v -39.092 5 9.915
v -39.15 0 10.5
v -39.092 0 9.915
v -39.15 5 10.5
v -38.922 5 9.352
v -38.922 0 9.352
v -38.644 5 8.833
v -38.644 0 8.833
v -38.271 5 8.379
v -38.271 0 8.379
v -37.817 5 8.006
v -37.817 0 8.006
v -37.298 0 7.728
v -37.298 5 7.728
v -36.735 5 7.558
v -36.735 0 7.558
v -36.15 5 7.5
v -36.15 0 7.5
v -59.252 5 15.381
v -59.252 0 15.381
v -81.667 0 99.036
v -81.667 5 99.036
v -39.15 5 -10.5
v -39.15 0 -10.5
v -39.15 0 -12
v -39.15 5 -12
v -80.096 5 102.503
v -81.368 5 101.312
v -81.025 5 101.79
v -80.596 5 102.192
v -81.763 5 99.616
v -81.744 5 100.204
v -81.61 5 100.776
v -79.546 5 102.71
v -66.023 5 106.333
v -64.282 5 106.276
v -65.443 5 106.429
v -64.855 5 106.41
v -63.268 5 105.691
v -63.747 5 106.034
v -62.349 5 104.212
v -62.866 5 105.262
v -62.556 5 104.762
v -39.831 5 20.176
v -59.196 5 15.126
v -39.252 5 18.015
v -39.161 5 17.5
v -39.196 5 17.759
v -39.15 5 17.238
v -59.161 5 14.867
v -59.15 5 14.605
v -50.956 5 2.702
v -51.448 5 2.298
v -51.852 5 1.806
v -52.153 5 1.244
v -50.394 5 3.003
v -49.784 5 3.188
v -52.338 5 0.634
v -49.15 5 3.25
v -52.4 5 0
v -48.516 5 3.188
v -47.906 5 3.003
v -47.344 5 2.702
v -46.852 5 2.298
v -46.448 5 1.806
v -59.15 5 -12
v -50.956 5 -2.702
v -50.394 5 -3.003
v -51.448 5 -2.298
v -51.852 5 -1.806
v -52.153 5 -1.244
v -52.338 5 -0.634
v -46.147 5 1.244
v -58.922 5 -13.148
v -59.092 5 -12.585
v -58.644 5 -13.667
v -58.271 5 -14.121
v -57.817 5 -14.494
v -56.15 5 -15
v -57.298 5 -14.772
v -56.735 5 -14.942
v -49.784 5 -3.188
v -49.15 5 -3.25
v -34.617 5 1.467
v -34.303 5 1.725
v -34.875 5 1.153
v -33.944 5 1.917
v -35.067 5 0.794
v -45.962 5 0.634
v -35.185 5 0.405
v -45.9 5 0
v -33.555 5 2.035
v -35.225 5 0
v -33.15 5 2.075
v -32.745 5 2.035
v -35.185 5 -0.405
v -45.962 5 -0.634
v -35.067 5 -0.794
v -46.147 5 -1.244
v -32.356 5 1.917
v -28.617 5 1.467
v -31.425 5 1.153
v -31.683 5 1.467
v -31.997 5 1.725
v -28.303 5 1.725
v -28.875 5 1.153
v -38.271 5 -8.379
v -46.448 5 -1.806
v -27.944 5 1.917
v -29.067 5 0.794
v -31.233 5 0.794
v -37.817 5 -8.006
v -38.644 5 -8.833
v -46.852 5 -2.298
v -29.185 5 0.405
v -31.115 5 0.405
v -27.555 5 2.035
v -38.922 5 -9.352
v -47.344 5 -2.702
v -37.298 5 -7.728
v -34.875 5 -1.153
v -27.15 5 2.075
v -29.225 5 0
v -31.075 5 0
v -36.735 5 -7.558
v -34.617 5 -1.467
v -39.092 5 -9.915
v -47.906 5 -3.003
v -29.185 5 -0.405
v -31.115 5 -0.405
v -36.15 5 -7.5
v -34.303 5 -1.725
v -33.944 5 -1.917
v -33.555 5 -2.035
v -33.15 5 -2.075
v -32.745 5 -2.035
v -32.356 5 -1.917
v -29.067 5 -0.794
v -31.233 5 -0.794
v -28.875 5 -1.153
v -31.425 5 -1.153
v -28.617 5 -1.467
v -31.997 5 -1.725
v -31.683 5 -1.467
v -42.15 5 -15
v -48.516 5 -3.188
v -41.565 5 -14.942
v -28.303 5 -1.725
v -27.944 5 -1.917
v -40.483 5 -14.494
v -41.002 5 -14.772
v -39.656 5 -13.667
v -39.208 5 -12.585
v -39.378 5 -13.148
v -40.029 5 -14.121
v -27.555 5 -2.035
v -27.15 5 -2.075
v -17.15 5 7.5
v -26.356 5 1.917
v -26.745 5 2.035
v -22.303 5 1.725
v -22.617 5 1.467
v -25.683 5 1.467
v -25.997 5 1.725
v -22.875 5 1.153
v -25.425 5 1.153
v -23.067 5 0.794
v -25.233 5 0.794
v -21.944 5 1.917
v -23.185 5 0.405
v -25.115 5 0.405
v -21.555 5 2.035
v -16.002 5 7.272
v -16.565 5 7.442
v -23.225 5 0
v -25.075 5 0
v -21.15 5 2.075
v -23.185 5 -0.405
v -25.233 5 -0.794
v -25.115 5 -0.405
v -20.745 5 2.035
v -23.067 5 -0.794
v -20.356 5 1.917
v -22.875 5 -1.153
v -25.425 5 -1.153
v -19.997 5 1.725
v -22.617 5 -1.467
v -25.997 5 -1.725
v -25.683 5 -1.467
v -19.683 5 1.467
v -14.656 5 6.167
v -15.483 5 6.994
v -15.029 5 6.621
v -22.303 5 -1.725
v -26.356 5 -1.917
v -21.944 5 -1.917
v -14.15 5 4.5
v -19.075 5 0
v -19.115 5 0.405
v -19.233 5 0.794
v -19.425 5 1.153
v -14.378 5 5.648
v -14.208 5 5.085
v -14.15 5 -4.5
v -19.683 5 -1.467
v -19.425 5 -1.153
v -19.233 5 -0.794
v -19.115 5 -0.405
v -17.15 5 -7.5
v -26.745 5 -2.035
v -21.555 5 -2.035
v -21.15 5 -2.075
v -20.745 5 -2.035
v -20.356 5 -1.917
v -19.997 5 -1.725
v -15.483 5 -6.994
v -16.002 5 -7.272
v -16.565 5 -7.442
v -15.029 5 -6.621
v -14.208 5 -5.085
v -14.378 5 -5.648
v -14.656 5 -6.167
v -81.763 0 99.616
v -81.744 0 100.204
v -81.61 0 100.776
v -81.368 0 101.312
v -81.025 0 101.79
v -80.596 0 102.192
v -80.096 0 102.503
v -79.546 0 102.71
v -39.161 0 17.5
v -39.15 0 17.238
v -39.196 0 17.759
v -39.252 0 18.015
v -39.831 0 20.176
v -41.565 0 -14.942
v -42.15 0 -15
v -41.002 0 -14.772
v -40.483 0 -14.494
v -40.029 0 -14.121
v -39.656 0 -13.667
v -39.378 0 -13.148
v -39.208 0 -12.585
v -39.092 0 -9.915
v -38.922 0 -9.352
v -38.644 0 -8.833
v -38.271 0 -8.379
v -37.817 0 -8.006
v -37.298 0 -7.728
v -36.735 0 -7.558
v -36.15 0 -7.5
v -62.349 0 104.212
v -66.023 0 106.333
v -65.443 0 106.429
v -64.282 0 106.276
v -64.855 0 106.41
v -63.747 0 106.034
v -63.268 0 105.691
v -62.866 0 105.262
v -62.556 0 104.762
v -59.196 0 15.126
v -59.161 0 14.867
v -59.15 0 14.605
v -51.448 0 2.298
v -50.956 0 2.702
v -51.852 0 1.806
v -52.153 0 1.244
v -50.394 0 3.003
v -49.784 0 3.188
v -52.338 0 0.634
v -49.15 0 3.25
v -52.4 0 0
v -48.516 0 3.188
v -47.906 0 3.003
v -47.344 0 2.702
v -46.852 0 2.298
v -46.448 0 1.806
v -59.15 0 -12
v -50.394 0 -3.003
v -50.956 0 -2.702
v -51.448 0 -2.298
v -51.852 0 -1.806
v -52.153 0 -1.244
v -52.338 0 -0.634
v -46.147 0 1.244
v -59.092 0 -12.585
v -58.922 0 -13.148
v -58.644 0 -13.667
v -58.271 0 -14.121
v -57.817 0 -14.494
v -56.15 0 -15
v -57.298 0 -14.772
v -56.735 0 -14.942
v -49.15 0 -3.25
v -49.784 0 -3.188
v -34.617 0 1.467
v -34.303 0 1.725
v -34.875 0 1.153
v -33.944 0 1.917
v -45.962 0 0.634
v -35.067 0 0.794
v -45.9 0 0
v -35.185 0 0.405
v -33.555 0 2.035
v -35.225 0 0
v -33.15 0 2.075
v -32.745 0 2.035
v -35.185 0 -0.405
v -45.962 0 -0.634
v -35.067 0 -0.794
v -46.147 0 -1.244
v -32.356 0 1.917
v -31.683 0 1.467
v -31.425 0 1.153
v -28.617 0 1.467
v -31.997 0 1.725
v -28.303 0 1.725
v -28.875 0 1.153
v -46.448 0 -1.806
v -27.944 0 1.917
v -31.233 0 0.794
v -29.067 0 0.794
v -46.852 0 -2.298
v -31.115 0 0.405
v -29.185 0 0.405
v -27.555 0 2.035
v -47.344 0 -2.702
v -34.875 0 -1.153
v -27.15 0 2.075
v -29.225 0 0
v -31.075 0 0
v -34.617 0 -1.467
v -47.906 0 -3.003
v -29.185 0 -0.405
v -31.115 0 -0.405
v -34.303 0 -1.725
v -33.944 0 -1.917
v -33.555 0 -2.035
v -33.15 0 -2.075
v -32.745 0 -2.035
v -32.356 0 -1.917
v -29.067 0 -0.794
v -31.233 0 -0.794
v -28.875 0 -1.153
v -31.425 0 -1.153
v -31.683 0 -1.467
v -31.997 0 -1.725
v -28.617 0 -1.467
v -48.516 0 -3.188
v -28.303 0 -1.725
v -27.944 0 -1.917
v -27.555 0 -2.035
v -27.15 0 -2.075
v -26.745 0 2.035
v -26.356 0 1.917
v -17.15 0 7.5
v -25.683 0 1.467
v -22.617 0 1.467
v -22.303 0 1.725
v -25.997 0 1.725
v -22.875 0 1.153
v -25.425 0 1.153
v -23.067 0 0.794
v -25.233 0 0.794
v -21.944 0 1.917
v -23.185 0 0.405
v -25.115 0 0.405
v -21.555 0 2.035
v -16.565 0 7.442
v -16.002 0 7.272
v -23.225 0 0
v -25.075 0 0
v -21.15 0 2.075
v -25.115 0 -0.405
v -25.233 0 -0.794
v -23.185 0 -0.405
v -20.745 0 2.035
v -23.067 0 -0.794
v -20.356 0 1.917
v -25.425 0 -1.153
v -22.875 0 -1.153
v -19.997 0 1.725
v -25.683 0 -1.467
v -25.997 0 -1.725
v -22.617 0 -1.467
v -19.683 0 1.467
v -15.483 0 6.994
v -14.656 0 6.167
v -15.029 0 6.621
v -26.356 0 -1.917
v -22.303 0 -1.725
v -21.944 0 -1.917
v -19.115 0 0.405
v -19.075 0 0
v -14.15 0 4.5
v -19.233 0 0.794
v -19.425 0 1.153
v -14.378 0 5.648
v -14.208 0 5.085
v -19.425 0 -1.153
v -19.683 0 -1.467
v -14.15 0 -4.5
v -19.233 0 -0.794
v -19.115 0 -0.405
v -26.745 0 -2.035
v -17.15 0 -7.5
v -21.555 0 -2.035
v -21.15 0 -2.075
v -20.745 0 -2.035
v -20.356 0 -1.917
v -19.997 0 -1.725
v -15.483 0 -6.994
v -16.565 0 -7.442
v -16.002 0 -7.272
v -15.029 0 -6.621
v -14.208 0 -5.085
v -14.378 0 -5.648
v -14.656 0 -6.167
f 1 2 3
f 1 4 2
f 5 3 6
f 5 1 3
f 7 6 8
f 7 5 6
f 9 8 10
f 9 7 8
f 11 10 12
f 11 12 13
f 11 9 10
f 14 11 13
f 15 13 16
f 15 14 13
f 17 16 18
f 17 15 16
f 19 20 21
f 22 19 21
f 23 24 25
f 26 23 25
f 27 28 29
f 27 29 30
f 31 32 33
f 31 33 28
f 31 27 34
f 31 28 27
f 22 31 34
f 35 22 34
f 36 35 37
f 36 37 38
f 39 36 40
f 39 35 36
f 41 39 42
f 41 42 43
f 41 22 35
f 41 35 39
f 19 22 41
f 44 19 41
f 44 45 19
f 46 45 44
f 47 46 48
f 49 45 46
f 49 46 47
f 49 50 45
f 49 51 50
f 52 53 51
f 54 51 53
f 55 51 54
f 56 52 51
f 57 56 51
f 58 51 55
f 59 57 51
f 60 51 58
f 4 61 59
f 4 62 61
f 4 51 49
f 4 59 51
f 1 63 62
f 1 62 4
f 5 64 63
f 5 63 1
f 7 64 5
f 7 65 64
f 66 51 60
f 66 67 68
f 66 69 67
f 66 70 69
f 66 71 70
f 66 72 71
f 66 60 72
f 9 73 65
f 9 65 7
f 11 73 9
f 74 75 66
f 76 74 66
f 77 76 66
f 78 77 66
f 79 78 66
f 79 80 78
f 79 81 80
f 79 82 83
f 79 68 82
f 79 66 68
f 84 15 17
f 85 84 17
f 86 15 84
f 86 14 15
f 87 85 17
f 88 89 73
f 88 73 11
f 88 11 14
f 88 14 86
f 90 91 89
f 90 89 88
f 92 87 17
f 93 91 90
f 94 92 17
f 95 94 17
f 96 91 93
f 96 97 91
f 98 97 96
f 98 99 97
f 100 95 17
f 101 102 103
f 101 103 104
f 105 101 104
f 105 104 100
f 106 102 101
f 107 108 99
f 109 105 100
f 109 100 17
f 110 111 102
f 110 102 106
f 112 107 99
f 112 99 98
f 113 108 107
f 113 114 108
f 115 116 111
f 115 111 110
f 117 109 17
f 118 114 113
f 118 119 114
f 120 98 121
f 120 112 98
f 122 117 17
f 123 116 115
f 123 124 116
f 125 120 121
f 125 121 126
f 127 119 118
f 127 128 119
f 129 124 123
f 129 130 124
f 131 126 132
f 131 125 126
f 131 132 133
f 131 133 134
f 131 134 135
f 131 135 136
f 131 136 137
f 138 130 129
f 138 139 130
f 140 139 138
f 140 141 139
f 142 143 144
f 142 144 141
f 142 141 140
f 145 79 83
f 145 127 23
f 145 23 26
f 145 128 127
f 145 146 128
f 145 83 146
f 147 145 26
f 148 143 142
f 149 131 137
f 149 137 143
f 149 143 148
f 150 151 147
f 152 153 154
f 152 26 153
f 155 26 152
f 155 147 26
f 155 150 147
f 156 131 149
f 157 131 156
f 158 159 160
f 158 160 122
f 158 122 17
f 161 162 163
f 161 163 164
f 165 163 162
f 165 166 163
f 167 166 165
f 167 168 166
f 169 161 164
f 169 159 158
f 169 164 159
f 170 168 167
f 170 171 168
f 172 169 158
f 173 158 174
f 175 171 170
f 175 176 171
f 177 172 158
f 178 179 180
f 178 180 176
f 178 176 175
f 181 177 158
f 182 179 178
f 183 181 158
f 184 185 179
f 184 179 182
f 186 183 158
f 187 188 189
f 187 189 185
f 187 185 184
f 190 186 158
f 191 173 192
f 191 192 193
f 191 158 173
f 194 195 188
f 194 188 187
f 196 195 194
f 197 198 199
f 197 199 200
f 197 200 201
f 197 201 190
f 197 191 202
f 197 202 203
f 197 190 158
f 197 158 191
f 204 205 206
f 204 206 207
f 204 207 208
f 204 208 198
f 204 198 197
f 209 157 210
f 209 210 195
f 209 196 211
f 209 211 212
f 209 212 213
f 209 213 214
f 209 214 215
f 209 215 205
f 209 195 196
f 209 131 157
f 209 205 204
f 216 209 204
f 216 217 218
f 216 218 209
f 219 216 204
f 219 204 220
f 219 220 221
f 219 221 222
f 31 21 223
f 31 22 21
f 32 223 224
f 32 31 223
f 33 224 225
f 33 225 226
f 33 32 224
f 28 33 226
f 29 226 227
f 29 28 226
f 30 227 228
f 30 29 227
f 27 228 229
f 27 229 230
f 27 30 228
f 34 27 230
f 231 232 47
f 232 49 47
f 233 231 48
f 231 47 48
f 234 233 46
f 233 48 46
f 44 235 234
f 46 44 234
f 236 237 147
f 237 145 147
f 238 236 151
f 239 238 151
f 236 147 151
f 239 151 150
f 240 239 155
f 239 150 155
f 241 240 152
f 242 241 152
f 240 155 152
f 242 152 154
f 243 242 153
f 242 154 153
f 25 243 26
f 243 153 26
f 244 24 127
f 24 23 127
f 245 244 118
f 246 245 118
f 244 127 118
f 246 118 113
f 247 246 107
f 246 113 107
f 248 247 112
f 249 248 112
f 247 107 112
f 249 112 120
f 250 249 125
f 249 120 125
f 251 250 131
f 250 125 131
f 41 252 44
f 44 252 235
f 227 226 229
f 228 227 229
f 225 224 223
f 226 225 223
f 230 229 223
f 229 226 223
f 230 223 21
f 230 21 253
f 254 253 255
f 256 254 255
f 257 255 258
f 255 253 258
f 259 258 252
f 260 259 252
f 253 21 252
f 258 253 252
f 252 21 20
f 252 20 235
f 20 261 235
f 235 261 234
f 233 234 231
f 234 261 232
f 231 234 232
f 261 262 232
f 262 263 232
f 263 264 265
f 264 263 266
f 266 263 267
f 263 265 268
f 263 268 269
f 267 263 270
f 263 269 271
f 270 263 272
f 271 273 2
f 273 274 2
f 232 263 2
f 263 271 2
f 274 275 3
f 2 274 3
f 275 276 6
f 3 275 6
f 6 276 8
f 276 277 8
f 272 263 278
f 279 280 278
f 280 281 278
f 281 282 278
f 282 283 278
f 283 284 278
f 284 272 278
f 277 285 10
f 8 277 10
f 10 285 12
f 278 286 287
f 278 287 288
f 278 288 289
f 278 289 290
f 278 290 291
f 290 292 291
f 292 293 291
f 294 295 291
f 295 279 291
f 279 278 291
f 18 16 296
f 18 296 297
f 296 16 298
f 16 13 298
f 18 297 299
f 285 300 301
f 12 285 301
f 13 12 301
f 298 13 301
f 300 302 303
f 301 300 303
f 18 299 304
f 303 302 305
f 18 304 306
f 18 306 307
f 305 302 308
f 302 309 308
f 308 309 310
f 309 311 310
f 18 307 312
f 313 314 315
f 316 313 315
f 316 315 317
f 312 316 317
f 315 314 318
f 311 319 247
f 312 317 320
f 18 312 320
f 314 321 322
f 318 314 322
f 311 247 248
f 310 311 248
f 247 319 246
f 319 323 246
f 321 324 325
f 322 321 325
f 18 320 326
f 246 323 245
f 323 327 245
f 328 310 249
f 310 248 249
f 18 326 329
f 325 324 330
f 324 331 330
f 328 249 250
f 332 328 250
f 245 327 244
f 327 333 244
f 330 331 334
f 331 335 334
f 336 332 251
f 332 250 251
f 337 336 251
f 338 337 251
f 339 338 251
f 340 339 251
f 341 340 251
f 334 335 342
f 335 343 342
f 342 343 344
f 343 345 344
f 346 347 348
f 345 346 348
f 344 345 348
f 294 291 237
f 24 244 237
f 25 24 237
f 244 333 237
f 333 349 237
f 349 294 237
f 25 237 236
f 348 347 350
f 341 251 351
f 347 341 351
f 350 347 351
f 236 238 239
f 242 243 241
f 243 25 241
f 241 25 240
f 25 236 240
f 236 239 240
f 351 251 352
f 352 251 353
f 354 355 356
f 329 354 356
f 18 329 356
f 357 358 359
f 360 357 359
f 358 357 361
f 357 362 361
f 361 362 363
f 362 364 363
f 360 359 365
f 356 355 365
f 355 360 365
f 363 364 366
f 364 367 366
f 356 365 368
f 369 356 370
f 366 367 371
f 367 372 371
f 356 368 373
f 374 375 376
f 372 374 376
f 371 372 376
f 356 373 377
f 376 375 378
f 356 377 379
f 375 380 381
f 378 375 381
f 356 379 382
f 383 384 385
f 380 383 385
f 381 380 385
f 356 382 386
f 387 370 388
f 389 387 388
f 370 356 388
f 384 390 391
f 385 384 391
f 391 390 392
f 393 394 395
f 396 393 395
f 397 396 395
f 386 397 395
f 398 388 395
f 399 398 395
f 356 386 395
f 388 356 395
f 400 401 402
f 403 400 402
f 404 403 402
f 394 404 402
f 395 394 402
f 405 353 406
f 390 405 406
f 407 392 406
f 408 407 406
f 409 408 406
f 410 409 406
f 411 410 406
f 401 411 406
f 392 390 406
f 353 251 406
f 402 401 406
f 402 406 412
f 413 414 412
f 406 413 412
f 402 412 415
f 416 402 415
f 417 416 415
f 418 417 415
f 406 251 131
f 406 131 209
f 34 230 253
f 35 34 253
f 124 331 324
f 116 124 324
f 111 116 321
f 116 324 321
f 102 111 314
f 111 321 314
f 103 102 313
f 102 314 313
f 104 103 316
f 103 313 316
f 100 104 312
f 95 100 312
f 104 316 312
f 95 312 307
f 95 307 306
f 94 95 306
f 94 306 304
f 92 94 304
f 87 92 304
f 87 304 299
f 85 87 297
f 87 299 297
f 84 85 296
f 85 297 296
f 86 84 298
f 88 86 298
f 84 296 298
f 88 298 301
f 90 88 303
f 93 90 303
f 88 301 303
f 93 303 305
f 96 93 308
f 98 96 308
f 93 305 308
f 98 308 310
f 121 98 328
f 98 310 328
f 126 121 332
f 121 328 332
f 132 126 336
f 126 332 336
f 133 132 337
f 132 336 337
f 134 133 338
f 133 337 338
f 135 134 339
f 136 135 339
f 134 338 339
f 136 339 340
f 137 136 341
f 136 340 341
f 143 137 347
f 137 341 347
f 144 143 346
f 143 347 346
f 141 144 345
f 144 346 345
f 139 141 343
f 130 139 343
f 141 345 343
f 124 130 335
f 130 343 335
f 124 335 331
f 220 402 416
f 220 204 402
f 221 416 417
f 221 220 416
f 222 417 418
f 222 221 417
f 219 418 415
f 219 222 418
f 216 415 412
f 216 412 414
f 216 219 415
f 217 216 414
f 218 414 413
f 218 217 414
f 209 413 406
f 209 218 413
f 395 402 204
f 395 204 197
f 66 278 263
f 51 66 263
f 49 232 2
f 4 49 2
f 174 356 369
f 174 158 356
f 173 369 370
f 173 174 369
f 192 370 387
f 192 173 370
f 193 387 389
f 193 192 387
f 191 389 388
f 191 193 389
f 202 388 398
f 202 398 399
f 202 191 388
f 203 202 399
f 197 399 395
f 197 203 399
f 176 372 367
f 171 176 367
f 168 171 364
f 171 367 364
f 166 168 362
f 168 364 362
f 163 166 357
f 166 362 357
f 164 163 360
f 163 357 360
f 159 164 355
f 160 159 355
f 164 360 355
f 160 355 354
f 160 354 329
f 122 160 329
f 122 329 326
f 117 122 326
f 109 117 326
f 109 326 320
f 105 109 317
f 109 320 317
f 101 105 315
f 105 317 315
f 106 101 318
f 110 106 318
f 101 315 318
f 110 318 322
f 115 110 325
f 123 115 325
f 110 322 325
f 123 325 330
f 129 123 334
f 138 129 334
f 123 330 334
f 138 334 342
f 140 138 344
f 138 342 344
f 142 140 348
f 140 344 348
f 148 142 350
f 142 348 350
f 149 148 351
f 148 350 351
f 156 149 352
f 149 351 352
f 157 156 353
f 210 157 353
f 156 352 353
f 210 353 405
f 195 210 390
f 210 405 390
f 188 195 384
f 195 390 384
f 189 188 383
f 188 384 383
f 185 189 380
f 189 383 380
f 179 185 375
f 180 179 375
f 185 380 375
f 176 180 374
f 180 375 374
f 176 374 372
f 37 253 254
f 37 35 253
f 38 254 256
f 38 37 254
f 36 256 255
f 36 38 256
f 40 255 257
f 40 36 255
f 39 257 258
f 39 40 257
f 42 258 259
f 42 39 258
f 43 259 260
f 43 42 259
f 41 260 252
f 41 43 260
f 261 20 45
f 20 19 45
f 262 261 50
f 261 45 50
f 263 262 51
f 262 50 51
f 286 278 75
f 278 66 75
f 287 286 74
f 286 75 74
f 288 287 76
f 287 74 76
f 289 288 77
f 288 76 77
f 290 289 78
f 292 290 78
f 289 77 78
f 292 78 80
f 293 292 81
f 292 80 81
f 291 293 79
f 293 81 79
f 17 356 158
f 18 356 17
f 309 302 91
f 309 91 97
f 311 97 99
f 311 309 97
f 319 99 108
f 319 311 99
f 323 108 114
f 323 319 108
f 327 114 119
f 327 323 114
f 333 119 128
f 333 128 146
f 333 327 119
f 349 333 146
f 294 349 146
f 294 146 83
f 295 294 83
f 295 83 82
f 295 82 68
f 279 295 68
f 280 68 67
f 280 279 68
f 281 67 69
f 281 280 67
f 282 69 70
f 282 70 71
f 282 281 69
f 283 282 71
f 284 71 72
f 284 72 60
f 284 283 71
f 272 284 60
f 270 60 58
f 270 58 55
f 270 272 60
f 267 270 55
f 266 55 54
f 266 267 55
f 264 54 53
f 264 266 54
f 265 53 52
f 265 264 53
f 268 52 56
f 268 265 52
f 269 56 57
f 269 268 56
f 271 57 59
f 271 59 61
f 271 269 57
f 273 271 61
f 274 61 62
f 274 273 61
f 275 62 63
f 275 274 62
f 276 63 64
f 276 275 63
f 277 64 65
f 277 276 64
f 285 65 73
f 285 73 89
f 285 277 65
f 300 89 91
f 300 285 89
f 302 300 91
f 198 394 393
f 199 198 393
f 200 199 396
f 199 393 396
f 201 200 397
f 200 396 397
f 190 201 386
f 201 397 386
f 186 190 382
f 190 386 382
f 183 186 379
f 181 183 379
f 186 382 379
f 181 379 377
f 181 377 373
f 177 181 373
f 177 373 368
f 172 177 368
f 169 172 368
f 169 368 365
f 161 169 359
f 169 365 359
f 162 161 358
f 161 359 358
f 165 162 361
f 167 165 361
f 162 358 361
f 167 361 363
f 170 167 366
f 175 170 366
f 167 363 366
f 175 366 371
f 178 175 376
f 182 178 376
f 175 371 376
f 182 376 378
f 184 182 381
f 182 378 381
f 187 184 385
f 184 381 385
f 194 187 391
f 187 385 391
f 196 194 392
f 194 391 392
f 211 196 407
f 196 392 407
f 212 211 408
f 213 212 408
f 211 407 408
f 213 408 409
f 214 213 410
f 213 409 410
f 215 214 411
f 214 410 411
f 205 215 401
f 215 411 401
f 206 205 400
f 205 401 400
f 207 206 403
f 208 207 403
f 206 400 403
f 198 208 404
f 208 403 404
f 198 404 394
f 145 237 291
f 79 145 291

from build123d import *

# Parameters (mm, degrees)
SKETCH1_R           = 3.25
BOSS_EXTRUDE1_DEPTH = 5
SKETCH2_R           = 2.075
BOSS_EXTRUDE2_DEPTH = 5
FILLET1_R           = 3


with BuildPart() as part:
    # Sketch1 → Boss-Extrude1 (new body)
    with BuildSketch(Plane(origin=(0, 0, 0), x_dir=(1, 0, 0), z_dir=(0, 1, 0))):
        Polygon((-59.15, -15), (-82.443714059, -101.933324366), (-63.125197533, -107.109705268), (-39.831483474, -20.176380902), (-39.15, -17.633049952), (-39.15, -15), (-39.15, 15), (-59.15, 15), align=None)
        with Locations((-49.15, 0)):
            Circle(SKETCH1_R, mode=Mode.SUBTRACT)
    extrude(amount=BOSS_EXTRUDE1_DEPTH)

    # Sketch2 → Boss-Extrude2 (add)
    with BuildSketch(Plane.XZ):
        Polygon((-14.15, -7.5), (-14.15, 7.5), (-27.15, 7.5), (-33.15, 7.5), (-39.15, 7.5), (-39.15, -7.5), align=None)
        with Locations((-33.15, 0)):
            Circle(SKETCH2_R, mode=Mode.SUBTRACT)
        with Locations((-27.15, 0)):
            Circle(SKETCH2_R, mode=Mode.SUBTRACT)
        with Locations((-21.15, 0)):
            Circle(SKETCH2_R, mode=Mode.SUBTRACT)
    extrude(amount=-BOSS_EXTRUDE2_DEPTH)

    # Fillet1
    fillet1_edges = [part.edges().sort_by_distance(p)[0] for p in [
        (-39.15, 2.5, 17.633049952),
        (-63.125197533, 2.5, 107.109705268),
        (-82.443714059, 2.5, 101.933324366),
        (-59.15, 2.5, 15),
        (-59.15, 2.5, -15),
        (-39.15, 2.5, -15),
        (-14.15, 2.5, -7.5),
        (-39.15, 2.5, -7.5),
        (-39.15, 2.5, 7.5),
        (-14.15, 2.5, 7.5),
    ]]
    fillet(fillet1_edges, radius=FILLET1_R)


solid = part.part
